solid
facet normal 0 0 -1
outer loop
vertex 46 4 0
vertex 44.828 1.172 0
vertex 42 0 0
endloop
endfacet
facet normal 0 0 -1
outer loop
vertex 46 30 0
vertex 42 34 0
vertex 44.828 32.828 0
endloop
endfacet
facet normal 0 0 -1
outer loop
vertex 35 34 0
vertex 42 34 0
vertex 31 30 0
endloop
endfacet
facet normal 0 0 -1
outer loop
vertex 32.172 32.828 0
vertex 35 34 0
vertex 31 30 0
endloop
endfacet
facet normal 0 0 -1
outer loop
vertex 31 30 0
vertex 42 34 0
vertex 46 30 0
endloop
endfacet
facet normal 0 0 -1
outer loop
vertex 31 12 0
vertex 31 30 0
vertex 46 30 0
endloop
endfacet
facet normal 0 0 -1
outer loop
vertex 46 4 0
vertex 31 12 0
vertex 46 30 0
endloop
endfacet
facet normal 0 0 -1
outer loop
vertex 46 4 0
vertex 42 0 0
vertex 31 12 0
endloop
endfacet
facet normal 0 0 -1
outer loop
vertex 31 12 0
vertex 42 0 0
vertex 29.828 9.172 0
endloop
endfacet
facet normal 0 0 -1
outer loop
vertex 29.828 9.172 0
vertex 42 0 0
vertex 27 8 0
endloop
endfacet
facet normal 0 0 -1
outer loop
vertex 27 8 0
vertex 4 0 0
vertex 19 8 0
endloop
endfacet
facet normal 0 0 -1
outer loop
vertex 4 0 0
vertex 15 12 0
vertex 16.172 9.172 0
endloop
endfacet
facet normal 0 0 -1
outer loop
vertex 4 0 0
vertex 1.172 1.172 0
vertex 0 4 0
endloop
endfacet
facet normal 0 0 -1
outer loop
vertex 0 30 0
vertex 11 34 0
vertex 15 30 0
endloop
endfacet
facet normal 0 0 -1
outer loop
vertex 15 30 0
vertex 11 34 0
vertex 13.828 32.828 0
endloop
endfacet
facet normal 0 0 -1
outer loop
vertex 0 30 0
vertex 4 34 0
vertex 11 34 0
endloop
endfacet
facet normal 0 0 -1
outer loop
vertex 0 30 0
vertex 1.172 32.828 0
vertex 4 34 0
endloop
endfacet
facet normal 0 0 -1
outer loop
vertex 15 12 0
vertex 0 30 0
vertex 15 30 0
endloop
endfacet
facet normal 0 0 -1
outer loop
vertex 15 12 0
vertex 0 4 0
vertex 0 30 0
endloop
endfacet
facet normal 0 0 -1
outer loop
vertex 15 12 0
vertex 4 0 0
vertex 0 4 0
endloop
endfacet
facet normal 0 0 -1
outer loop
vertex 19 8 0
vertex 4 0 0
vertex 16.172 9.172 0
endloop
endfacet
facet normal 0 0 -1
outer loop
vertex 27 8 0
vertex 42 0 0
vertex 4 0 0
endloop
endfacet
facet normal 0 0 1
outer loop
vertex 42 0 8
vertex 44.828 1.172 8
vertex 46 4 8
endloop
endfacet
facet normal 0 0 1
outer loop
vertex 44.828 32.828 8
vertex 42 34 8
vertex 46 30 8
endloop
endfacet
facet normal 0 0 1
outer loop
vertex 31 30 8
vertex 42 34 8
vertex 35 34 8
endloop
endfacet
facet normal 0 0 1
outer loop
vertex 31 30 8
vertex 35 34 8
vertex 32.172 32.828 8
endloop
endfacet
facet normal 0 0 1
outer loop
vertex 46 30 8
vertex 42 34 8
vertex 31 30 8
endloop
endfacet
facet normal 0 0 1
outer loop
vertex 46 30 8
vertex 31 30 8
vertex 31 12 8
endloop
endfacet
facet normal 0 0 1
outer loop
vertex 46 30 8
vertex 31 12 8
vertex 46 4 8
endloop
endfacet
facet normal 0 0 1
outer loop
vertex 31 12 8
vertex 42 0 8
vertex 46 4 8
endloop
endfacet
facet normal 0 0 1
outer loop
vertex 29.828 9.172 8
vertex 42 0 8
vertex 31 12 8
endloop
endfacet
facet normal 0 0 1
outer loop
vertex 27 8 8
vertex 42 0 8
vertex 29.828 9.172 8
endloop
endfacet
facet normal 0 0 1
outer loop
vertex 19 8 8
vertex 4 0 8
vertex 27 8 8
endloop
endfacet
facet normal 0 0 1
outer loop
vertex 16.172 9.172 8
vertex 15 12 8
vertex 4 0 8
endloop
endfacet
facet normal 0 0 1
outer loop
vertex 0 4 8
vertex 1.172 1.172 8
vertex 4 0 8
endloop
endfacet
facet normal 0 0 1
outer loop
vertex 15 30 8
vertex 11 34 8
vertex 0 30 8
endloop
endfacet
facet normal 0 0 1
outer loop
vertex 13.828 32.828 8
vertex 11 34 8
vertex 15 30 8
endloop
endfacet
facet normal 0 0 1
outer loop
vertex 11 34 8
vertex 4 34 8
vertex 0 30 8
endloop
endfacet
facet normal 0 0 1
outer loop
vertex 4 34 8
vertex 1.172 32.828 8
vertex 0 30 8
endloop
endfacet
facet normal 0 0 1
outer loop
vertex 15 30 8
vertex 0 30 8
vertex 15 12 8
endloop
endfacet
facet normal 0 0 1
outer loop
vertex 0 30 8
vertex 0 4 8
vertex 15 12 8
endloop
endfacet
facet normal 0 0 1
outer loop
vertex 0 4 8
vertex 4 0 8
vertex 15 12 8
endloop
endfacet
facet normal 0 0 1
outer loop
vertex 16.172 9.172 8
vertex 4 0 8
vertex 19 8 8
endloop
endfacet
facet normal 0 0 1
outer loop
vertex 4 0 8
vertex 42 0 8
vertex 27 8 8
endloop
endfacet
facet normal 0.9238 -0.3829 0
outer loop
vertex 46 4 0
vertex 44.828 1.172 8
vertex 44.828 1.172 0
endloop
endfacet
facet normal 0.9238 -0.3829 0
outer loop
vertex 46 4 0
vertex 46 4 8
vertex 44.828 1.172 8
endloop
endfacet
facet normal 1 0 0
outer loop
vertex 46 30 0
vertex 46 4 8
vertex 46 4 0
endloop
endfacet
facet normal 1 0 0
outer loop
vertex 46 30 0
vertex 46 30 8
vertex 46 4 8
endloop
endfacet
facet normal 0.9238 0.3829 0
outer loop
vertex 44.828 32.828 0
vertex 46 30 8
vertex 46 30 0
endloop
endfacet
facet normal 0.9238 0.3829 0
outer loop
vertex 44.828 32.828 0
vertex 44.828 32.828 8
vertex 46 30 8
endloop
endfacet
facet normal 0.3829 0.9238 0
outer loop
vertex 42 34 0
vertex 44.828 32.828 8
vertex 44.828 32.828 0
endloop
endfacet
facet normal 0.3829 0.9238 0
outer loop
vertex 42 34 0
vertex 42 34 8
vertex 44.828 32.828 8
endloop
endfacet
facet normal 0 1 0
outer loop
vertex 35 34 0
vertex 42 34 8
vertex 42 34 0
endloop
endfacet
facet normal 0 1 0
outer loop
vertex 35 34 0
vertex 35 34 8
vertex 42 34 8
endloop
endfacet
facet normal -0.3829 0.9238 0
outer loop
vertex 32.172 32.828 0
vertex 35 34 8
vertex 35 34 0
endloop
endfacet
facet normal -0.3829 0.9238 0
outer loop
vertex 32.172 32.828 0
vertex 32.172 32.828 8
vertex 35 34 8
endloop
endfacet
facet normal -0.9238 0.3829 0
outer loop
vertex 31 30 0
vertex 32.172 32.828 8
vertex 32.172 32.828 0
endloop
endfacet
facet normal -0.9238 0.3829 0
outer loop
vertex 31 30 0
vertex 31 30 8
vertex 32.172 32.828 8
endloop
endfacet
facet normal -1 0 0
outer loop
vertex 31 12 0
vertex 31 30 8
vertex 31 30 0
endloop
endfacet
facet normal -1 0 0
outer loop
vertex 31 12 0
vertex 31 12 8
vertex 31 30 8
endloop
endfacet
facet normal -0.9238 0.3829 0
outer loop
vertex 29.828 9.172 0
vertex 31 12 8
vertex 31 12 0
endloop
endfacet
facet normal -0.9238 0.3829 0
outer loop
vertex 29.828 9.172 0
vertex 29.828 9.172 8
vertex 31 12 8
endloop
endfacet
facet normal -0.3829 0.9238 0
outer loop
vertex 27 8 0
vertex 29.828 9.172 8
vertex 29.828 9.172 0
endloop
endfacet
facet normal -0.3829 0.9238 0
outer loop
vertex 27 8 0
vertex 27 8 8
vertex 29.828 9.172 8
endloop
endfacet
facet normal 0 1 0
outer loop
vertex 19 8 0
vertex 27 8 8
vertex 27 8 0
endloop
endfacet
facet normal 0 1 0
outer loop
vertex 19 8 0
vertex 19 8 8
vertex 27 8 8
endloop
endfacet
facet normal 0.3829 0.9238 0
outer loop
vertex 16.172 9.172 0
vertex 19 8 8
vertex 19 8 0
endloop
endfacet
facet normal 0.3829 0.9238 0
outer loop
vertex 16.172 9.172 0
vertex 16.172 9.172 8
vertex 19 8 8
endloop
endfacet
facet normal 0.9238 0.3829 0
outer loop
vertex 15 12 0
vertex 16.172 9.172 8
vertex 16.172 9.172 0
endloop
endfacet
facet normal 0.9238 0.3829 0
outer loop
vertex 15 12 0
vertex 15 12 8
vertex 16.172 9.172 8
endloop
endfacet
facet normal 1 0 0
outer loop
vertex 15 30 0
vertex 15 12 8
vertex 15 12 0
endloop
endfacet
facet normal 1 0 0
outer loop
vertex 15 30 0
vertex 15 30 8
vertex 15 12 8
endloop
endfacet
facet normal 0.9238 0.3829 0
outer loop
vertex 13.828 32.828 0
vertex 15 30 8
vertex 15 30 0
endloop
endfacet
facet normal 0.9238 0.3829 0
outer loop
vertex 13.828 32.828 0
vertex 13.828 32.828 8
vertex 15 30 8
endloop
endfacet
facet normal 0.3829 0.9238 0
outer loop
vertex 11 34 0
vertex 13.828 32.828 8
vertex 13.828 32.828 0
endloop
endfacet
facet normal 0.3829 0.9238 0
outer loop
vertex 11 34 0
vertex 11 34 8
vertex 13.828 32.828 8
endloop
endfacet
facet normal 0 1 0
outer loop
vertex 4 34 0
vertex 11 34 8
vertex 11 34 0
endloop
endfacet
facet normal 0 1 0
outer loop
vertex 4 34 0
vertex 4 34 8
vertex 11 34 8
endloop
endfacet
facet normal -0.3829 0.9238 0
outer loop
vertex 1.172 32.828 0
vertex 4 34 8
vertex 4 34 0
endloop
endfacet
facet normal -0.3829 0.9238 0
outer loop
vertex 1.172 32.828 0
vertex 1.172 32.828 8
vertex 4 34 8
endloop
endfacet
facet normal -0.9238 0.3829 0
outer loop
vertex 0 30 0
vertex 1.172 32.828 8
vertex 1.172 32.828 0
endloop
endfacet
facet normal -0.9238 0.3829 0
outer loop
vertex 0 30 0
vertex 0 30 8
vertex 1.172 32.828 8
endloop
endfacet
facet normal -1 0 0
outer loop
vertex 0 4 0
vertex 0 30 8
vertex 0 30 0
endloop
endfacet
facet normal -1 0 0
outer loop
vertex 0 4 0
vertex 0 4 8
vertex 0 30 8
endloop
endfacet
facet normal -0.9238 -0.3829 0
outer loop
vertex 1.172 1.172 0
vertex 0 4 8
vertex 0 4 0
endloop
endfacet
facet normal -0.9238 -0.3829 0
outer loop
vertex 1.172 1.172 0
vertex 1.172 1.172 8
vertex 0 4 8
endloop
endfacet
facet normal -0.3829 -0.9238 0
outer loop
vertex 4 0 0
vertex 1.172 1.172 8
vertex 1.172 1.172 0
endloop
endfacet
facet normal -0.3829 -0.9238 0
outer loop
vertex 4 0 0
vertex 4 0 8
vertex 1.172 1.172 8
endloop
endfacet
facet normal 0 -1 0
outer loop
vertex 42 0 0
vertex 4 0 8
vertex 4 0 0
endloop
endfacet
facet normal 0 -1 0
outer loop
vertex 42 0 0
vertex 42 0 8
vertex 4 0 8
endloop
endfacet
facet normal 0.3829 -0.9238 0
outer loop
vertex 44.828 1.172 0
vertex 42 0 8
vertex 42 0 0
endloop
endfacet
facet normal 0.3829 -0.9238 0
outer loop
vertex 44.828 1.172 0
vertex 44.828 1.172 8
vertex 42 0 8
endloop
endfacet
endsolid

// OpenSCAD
$fn = 32;

// ----------------------------------------------------------------------
// Eye lug: clevis, 8 mm thick
// ----------------------------------------------------------------------

// --- parameters (mm) ---
profile_height = 8;       // extrusion height
profile_points = 24;      // points of the closed outline

profile = [[0, 4], [1.172, 1.172], [4, 0], [42, 0], [44.828, 1.172], [46, 4], [46, 30], [44.828, 32.828], [42, 34], [35, 34], [32.172, 32.828], [31, 30], [31, 12], [29.828, 9.172], [27, 8], [19, 8], [16.172, 9.172], [15, 12], [15, 30], [13.828, 32.828], [11, 34], [4, 34], [1.172, 32.828], [0, 30]];  // single closed polygon, 24 points, counter clockwise

// --- the one profile operation ---
linear_extrude(height = profile_height) polygon(points = profile);
